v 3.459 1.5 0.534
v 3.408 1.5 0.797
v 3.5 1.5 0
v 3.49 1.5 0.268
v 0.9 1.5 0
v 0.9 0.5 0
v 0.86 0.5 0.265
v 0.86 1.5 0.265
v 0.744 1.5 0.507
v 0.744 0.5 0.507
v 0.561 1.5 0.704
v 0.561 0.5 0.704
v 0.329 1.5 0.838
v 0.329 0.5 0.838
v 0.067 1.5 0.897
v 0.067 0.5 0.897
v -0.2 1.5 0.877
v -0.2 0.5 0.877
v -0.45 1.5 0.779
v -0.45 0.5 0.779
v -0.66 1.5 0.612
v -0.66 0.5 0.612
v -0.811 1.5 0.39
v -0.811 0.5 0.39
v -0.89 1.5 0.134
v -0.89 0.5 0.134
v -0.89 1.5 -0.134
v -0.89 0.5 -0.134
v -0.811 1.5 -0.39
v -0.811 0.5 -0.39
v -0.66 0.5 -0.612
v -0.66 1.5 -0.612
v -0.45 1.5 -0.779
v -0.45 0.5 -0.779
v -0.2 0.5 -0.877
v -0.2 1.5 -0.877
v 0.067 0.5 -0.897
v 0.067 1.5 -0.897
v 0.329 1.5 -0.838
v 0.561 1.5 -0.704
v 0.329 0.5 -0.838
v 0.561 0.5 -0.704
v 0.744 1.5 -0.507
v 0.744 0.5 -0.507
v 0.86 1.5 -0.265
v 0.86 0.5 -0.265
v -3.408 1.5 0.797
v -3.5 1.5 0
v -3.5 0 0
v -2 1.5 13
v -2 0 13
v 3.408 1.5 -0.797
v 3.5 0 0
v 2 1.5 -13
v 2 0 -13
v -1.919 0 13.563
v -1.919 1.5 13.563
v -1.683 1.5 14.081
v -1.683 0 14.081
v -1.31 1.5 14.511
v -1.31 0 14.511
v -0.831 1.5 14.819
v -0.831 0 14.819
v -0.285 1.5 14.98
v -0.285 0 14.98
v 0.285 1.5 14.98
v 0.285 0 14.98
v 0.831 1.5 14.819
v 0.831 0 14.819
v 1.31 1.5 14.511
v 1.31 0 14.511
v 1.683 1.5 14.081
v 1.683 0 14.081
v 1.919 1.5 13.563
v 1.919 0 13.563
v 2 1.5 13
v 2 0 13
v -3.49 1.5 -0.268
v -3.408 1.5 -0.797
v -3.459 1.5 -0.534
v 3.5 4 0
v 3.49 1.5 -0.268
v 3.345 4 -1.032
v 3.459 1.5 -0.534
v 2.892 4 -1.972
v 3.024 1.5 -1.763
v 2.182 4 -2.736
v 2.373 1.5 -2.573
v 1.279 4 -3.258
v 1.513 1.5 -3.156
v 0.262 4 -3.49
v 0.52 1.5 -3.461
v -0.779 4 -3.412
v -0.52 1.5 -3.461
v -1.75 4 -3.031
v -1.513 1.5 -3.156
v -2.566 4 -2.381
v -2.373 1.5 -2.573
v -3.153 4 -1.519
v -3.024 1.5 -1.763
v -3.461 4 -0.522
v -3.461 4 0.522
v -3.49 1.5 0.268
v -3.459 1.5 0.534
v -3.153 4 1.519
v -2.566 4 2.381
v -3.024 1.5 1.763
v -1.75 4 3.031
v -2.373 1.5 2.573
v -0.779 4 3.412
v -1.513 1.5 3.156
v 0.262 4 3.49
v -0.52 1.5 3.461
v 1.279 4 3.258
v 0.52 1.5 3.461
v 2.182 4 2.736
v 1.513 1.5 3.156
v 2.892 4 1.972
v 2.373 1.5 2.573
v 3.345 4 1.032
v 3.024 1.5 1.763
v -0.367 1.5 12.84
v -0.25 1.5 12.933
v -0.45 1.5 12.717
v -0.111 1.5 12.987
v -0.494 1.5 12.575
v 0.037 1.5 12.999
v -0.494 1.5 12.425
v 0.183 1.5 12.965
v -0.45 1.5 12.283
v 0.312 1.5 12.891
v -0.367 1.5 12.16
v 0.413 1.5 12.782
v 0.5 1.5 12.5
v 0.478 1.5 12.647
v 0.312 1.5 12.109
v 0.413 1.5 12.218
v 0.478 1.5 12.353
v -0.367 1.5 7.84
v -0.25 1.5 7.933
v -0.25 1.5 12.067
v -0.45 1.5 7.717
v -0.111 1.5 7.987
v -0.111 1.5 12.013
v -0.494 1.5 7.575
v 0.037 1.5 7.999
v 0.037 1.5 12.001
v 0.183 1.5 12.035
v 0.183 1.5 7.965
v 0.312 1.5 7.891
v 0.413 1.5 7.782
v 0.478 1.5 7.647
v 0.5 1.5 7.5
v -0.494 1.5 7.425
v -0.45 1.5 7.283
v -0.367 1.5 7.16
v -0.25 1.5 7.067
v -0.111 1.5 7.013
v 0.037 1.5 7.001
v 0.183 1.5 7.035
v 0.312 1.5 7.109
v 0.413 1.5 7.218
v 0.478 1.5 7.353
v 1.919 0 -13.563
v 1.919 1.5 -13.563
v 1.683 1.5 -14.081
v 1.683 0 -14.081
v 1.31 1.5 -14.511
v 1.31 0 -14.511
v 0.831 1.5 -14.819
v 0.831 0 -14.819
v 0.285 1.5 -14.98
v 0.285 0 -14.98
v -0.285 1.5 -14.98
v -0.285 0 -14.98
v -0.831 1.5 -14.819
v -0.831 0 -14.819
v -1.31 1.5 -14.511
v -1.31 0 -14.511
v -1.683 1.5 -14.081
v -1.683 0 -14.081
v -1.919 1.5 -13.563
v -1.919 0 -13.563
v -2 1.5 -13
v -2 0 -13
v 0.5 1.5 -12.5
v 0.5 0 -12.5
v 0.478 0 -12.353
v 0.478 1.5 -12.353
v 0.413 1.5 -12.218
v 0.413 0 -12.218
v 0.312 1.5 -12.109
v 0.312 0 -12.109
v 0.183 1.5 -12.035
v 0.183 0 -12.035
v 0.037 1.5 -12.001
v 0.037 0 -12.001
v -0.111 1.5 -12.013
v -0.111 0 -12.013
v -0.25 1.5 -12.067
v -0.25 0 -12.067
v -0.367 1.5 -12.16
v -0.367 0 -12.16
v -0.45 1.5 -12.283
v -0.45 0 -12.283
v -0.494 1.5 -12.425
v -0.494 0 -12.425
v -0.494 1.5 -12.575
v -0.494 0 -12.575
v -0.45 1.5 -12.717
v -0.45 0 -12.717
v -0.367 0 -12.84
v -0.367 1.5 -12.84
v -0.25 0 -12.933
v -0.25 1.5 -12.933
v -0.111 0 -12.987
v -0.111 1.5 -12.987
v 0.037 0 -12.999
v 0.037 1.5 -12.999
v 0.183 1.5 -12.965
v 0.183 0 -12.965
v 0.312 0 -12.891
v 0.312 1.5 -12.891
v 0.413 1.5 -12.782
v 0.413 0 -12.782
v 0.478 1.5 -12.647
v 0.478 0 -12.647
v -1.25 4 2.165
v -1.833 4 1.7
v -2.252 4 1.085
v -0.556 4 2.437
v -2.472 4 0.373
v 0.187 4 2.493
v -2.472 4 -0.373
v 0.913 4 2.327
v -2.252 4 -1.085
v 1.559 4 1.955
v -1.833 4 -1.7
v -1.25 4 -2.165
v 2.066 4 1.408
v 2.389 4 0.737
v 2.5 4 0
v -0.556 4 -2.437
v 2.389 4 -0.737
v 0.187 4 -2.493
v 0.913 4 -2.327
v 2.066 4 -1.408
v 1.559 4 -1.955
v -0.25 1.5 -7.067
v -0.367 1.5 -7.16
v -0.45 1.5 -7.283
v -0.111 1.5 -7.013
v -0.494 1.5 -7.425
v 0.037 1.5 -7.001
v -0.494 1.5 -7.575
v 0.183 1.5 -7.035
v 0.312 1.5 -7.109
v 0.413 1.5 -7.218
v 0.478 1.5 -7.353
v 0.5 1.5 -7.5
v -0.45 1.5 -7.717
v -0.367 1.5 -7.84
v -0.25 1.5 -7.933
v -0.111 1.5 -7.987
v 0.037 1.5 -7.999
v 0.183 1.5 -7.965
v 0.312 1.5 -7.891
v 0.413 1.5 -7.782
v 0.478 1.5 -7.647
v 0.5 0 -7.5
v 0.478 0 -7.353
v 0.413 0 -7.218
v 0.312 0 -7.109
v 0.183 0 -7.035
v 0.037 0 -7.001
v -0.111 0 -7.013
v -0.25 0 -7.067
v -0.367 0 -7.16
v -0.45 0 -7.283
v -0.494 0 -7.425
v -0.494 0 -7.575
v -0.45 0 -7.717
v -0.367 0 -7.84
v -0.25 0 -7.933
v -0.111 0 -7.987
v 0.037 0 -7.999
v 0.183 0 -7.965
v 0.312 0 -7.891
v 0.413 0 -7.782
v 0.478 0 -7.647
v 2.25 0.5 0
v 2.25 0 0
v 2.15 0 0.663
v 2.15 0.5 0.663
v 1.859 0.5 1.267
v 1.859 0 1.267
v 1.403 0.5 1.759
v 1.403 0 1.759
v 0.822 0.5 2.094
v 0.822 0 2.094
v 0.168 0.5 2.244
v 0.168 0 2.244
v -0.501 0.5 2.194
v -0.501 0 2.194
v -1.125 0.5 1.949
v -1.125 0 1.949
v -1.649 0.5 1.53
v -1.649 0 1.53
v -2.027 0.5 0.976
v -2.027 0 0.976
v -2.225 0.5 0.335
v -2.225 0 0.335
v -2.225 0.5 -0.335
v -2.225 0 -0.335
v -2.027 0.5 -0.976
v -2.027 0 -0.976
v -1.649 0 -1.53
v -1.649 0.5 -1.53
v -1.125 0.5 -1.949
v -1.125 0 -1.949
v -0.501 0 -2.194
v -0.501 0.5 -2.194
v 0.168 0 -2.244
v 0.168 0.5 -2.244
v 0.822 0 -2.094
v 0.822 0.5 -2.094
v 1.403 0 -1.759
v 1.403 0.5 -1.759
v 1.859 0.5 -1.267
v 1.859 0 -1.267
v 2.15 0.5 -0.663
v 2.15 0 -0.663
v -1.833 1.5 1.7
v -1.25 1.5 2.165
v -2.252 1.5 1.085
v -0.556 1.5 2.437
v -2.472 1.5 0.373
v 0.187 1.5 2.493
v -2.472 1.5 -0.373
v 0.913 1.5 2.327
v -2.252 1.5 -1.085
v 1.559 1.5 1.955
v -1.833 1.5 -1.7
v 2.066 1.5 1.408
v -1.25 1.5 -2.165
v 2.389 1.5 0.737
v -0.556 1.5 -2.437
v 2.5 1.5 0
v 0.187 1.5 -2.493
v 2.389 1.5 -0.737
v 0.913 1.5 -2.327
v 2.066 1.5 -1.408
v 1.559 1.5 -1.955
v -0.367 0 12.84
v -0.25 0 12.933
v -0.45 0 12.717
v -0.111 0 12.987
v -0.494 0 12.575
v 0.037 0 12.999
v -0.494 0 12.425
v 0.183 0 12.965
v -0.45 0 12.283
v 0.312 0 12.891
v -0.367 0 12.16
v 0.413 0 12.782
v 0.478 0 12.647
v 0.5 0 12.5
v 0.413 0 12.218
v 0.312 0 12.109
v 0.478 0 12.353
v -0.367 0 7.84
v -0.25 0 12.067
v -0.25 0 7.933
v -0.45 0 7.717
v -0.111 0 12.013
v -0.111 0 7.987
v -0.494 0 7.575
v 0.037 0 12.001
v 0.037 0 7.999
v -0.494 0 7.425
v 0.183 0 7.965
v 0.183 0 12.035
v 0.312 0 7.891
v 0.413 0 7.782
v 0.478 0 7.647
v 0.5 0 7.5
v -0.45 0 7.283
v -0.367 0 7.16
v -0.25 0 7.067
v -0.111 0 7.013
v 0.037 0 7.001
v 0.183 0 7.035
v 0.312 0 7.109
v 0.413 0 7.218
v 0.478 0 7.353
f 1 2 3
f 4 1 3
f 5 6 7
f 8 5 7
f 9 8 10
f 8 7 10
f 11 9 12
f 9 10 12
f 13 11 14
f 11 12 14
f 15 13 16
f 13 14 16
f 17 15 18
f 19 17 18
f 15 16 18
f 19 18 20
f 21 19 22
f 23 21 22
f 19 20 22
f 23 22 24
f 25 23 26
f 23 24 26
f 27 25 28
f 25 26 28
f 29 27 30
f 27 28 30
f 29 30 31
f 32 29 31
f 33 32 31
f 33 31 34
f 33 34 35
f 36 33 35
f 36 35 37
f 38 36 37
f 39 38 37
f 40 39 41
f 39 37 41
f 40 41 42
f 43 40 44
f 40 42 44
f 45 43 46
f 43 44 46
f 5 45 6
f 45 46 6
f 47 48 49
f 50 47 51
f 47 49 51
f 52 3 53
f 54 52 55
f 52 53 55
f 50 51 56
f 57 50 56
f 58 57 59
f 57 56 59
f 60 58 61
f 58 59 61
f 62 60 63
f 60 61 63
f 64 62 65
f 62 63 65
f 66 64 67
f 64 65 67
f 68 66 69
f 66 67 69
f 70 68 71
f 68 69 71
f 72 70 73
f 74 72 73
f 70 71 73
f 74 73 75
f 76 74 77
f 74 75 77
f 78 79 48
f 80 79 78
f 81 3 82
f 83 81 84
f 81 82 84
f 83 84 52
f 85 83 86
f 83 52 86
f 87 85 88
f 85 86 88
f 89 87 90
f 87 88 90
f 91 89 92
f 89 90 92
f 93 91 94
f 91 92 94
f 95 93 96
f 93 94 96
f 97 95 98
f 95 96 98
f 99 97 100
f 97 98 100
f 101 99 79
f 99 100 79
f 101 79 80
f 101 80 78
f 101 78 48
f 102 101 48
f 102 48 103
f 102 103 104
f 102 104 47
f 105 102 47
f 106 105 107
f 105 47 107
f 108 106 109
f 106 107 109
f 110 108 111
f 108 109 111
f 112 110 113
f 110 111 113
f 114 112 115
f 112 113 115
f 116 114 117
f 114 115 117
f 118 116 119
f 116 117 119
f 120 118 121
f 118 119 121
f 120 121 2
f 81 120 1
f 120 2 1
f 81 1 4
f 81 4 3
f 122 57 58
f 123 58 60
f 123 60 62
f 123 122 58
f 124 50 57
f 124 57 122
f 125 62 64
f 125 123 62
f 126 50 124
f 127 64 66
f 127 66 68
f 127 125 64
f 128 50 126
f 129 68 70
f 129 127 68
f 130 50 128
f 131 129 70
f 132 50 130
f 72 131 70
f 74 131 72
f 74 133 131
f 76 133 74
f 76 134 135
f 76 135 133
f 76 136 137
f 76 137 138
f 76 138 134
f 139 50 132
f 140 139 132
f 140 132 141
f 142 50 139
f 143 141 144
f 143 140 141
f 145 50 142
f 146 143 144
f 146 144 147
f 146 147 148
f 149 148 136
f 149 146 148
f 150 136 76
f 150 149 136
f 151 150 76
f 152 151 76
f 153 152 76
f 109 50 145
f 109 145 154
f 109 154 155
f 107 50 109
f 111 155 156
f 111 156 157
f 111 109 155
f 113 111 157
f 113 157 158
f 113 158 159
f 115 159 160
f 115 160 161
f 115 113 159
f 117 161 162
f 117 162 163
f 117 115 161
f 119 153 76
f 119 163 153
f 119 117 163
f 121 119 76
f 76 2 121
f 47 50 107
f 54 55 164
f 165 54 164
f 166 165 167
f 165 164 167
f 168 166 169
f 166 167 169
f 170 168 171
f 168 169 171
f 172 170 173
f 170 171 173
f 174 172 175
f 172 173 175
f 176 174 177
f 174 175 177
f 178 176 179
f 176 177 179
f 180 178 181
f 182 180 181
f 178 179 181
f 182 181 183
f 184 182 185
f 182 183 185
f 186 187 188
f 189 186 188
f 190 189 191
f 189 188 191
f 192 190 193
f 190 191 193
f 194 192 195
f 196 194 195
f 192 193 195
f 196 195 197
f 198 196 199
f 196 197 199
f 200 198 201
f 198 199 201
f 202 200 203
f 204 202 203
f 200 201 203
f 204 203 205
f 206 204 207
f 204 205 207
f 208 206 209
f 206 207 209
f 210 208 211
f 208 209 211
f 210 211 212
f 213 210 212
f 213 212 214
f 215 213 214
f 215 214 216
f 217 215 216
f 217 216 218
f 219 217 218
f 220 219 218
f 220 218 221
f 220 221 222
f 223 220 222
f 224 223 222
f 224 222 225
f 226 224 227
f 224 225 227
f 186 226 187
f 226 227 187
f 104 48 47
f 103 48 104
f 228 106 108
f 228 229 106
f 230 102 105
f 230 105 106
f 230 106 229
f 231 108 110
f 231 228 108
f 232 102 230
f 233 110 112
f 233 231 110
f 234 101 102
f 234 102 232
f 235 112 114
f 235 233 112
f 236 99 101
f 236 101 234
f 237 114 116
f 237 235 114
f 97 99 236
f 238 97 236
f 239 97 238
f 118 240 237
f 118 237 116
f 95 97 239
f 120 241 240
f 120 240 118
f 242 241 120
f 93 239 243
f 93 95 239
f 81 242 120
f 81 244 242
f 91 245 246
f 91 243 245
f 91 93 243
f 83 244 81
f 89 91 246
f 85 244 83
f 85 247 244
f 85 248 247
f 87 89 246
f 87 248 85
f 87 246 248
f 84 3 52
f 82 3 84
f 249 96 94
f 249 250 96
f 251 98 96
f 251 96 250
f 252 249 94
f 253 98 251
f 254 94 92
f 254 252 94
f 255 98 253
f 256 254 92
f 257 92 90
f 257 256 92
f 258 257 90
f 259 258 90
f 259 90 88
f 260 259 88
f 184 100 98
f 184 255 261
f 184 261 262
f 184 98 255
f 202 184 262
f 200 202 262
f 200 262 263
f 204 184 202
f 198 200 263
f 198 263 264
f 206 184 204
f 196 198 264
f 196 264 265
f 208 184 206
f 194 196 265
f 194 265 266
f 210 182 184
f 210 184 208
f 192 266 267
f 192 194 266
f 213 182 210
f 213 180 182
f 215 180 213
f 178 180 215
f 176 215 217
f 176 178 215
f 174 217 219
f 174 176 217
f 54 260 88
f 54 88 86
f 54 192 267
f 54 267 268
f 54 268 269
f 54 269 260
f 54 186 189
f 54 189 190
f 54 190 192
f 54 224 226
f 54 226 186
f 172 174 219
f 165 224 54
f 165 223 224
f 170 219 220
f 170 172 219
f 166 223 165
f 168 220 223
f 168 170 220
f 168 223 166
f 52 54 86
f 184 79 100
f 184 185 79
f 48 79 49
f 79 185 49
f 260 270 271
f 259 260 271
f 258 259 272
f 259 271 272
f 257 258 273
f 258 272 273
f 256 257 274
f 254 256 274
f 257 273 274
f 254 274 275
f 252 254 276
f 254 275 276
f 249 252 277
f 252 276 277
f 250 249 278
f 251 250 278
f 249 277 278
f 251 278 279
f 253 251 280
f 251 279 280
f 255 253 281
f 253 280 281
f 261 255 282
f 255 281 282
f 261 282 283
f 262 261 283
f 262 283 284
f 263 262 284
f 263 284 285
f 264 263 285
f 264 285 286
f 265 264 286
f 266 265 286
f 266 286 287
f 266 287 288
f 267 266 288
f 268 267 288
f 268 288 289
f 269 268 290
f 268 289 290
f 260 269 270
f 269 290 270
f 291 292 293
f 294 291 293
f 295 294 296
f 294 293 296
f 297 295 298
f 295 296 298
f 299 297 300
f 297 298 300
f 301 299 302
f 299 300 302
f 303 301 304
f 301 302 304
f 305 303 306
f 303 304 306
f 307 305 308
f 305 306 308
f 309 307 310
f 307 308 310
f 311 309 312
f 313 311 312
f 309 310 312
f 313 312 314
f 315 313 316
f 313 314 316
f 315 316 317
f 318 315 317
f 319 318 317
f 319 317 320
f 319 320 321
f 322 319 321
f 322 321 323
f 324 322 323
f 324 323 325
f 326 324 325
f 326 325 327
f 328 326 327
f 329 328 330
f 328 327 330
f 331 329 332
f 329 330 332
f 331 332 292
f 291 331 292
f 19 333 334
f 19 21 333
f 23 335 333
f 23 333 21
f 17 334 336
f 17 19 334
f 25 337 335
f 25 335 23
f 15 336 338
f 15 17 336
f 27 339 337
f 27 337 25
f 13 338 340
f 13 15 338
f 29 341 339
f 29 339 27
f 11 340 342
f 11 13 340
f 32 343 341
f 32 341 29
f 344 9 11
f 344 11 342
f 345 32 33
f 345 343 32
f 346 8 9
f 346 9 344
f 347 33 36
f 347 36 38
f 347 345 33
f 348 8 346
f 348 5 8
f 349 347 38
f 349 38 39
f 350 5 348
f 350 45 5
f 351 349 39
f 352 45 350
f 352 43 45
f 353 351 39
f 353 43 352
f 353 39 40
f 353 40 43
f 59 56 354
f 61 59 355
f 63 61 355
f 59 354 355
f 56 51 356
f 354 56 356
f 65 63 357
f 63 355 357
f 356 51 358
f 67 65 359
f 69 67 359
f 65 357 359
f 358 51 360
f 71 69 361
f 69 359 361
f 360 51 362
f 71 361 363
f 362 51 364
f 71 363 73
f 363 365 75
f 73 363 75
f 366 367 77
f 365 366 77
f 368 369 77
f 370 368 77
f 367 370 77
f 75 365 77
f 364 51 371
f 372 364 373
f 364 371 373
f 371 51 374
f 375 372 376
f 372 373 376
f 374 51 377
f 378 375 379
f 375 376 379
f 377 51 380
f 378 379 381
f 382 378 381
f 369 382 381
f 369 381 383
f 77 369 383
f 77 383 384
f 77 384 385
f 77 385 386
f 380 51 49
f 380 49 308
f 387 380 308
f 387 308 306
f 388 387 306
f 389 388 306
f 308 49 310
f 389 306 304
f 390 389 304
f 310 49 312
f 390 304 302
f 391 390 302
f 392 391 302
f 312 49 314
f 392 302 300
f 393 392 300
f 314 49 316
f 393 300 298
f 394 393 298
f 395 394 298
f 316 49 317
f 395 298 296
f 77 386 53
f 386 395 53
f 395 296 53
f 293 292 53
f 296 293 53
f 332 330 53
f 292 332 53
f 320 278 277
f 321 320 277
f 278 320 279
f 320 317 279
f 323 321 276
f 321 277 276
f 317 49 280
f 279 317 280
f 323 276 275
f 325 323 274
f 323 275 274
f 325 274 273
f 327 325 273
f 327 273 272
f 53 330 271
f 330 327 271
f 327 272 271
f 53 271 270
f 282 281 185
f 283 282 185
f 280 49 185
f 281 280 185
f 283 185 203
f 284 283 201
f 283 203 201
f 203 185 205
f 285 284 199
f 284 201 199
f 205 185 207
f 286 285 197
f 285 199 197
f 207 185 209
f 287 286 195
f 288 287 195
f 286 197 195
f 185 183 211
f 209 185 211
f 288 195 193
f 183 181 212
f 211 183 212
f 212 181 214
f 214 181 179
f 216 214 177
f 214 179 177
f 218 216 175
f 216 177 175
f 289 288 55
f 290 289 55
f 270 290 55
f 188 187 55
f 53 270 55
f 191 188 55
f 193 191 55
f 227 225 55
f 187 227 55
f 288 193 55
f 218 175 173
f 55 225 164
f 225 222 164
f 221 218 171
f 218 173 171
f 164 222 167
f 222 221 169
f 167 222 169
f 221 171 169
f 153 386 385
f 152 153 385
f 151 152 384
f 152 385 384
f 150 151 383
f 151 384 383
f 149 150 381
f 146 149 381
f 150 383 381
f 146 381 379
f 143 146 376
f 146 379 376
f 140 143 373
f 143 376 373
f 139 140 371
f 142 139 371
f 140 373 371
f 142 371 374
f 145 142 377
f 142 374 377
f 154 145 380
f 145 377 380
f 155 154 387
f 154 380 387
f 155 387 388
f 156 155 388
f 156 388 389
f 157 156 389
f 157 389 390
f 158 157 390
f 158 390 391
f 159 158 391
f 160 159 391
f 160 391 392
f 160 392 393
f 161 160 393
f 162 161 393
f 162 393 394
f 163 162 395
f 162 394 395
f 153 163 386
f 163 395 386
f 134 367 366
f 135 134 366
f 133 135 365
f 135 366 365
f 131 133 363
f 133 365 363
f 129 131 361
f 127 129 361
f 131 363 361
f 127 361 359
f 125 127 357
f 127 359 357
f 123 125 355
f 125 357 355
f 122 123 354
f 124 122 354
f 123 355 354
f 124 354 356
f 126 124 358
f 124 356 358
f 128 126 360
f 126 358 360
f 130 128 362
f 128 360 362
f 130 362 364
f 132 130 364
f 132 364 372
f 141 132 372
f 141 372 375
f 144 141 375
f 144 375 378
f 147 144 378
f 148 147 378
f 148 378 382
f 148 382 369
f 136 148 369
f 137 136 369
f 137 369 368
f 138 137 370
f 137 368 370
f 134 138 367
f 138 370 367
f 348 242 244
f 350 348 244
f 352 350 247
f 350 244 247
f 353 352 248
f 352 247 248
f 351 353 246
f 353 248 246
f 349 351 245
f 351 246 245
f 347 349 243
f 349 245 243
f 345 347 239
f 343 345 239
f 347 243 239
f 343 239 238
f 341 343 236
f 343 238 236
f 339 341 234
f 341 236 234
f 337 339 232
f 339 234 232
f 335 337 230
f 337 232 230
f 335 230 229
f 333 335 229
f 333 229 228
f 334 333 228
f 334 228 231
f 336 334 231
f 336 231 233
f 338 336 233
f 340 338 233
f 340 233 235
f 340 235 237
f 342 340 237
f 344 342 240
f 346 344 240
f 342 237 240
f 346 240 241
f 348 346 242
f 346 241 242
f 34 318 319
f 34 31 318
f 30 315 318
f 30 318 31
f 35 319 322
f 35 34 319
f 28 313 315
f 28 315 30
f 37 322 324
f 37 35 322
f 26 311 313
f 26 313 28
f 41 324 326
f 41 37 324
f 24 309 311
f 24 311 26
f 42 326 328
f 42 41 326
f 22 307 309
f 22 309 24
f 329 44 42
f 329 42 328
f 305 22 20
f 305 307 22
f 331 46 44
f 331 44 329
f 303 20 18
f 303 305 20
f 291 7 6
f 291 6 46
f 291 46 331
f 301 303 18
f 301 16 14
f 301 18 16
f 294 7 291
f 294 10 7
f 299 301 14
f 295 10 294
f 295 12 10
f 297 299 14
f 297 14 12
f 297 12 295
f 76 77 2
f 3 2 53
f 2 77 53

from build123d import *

# Parameters (mm, degrees)
EXTRUDE_2_DEPTH     = 1.5
SKETCH_7_R          = 3.5
EXTRUDE_3_DEPTH     = 2.5
SKETCH_8_R          = 2.5
CUT_EXTRUDE_1_DEPTH = 2.5
SKETCH_9_R          = 2.25
CUT_EXTRUDE_2_DEPTH = 0.5
SKETCH_10_R         = 0.9
CUT_EXTRUDE_3_DEPTH = 1
SKETCH_11_R         = 0.5
CUT_EXTRUDE_4_DEPTH = 1.5


with BuildPart() as part:
    # Эскиз1 → Бобышка-Вытянуть2 (new body)
    with BuildSketch(Plane(origin=(0, 0, 0), x_dir=(1, 0, 0), z_dir=(0, 1, 0))):
        with BuildLine():
            ThreePointArc((2, 13), (0, 15), (-2, 13))
            Line((-2, 13), (-3.5, 0))
            Line((-3.5, 0), (-2, -13))
            ThreePointArc((-2, -13), (0, -15), (2, -13))
            Line((2, -13), (3.5, 0))
            Line((3.5, 0), (2, 13))
        make_face()
    extrude(amount=EXTRUDE_2_DEPTH)

    # Эскиз7 → Бобышка-Вытянуть3 (add)
    with BuildSketch(Plane(origin=(0, 1.5, 0), x_dir=(1, 0, 0), z_dir=(0, 1, 0))):
        Circle(SKETCH_7_R)
    extrude(amount=EXTRUDE_3_DEPTH)

    # Эскиз8 → Вырез-Вытянуть1 (cut)
    with BuildSketch(Plane(origin=(0, 4, 0), x_dir=(1, 0, 0), z_dir=(0, 1, 0))):
        Circle(SKETCH_8_R)
    extrude(amount=-CUT_EXTRUDE_1_DEPTH, mode=Mode.SUBTRACT)

    # Эскиз9 → Вырез-Вытянуть2 (cut)
    with BuildSketch(Plane.XZ):
        Circle(SKETCH_9_R)
    extrude(amount=-CUT_EXTRUDE_2_DEPTH, mode=Mode.SUBTRACT)

    # Эскиз10 → Вырез-Вытянуть3 (cut)
    with BuildSketch(Plane.XZ.offset(-0.5)):
        Circle(SKETCH_10_R)
    extrude(amount=-CUT_EXTRUDE_3_DEPTH, mode=Mode.SUBTRACT)

    # Эскиз11 → Вырез-Вытянуть4 (cut)
    with BuildSketch(Plane.XZ):
        with Locations((0, -7.5)):
            Circle(SKETCH_11_R)
        with Locations((0, -12.5)):
            Circle(SKETCH_11_R)
        with Locations((0, 12.5)):
            Circle(SKETCH_11_R)
        with Locations((0, 7.5)):
            Circle(SKETCH_11_R)
    extrude(amount=-CUT_EXTRUDE_4_DEPTH, mode=Mode.SUBTRACT)


solid = part.part
